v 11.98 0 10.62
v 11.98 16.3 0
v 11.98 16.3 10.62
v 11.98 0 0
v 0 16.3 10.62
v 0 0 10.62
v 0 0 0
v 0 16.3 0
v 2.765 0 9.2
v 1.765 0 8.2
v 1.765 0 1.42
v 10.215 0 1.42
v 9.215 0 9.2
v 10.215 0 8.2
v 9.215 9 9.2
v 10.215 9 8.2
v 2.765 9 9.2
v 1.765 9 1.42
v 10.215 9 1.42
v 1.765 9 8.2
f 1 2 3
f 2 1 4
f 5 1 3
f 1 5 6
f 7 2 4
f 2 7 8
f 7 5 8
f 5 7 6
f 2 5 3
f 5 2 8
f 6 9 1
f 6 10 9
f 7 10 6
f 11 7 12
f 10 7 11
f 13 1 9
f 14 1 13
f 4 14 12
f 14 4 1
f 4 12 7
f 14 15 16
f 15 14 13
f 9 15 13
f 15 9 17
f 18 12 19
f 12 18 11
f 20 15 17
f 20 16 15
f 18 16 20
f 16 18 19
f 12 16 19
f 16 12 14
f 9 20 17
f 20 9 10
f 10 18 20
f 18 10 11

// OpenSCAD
module usb_b_plug() {
    // Dimensions - mm
    plug_w = 8.45;
    plug_h = 7.78;
    plug_l = 10.0;

    $fn = 25;

    translate([-plug_w/2,plug_l,-plug_h/2])rotate([90,0,0]) {
        linear_extrude(height=plug_l){
            polygon([[0,0],
                    [plug_w,0],
                    [plug_w,plug_h-1],
                    [plug_w-1,plug_h],
                    [1,plug_h],
                    [0,plug_h-1]]);
        }
    }
}

module usb_b_jack() {
    // Dimensions - mm
    usb_l = 16.3;
    usb_w = 36.09-24.11;
    usb_h = 10.62;

    $fn=25;

    color("Silver")difference() {
        cube([usb_w, usb_l, usb_h]); // main body
        translate([usb_w/2,-1,usb_h/2])usb_b_plug();
    }
}

usb_b_jack();
